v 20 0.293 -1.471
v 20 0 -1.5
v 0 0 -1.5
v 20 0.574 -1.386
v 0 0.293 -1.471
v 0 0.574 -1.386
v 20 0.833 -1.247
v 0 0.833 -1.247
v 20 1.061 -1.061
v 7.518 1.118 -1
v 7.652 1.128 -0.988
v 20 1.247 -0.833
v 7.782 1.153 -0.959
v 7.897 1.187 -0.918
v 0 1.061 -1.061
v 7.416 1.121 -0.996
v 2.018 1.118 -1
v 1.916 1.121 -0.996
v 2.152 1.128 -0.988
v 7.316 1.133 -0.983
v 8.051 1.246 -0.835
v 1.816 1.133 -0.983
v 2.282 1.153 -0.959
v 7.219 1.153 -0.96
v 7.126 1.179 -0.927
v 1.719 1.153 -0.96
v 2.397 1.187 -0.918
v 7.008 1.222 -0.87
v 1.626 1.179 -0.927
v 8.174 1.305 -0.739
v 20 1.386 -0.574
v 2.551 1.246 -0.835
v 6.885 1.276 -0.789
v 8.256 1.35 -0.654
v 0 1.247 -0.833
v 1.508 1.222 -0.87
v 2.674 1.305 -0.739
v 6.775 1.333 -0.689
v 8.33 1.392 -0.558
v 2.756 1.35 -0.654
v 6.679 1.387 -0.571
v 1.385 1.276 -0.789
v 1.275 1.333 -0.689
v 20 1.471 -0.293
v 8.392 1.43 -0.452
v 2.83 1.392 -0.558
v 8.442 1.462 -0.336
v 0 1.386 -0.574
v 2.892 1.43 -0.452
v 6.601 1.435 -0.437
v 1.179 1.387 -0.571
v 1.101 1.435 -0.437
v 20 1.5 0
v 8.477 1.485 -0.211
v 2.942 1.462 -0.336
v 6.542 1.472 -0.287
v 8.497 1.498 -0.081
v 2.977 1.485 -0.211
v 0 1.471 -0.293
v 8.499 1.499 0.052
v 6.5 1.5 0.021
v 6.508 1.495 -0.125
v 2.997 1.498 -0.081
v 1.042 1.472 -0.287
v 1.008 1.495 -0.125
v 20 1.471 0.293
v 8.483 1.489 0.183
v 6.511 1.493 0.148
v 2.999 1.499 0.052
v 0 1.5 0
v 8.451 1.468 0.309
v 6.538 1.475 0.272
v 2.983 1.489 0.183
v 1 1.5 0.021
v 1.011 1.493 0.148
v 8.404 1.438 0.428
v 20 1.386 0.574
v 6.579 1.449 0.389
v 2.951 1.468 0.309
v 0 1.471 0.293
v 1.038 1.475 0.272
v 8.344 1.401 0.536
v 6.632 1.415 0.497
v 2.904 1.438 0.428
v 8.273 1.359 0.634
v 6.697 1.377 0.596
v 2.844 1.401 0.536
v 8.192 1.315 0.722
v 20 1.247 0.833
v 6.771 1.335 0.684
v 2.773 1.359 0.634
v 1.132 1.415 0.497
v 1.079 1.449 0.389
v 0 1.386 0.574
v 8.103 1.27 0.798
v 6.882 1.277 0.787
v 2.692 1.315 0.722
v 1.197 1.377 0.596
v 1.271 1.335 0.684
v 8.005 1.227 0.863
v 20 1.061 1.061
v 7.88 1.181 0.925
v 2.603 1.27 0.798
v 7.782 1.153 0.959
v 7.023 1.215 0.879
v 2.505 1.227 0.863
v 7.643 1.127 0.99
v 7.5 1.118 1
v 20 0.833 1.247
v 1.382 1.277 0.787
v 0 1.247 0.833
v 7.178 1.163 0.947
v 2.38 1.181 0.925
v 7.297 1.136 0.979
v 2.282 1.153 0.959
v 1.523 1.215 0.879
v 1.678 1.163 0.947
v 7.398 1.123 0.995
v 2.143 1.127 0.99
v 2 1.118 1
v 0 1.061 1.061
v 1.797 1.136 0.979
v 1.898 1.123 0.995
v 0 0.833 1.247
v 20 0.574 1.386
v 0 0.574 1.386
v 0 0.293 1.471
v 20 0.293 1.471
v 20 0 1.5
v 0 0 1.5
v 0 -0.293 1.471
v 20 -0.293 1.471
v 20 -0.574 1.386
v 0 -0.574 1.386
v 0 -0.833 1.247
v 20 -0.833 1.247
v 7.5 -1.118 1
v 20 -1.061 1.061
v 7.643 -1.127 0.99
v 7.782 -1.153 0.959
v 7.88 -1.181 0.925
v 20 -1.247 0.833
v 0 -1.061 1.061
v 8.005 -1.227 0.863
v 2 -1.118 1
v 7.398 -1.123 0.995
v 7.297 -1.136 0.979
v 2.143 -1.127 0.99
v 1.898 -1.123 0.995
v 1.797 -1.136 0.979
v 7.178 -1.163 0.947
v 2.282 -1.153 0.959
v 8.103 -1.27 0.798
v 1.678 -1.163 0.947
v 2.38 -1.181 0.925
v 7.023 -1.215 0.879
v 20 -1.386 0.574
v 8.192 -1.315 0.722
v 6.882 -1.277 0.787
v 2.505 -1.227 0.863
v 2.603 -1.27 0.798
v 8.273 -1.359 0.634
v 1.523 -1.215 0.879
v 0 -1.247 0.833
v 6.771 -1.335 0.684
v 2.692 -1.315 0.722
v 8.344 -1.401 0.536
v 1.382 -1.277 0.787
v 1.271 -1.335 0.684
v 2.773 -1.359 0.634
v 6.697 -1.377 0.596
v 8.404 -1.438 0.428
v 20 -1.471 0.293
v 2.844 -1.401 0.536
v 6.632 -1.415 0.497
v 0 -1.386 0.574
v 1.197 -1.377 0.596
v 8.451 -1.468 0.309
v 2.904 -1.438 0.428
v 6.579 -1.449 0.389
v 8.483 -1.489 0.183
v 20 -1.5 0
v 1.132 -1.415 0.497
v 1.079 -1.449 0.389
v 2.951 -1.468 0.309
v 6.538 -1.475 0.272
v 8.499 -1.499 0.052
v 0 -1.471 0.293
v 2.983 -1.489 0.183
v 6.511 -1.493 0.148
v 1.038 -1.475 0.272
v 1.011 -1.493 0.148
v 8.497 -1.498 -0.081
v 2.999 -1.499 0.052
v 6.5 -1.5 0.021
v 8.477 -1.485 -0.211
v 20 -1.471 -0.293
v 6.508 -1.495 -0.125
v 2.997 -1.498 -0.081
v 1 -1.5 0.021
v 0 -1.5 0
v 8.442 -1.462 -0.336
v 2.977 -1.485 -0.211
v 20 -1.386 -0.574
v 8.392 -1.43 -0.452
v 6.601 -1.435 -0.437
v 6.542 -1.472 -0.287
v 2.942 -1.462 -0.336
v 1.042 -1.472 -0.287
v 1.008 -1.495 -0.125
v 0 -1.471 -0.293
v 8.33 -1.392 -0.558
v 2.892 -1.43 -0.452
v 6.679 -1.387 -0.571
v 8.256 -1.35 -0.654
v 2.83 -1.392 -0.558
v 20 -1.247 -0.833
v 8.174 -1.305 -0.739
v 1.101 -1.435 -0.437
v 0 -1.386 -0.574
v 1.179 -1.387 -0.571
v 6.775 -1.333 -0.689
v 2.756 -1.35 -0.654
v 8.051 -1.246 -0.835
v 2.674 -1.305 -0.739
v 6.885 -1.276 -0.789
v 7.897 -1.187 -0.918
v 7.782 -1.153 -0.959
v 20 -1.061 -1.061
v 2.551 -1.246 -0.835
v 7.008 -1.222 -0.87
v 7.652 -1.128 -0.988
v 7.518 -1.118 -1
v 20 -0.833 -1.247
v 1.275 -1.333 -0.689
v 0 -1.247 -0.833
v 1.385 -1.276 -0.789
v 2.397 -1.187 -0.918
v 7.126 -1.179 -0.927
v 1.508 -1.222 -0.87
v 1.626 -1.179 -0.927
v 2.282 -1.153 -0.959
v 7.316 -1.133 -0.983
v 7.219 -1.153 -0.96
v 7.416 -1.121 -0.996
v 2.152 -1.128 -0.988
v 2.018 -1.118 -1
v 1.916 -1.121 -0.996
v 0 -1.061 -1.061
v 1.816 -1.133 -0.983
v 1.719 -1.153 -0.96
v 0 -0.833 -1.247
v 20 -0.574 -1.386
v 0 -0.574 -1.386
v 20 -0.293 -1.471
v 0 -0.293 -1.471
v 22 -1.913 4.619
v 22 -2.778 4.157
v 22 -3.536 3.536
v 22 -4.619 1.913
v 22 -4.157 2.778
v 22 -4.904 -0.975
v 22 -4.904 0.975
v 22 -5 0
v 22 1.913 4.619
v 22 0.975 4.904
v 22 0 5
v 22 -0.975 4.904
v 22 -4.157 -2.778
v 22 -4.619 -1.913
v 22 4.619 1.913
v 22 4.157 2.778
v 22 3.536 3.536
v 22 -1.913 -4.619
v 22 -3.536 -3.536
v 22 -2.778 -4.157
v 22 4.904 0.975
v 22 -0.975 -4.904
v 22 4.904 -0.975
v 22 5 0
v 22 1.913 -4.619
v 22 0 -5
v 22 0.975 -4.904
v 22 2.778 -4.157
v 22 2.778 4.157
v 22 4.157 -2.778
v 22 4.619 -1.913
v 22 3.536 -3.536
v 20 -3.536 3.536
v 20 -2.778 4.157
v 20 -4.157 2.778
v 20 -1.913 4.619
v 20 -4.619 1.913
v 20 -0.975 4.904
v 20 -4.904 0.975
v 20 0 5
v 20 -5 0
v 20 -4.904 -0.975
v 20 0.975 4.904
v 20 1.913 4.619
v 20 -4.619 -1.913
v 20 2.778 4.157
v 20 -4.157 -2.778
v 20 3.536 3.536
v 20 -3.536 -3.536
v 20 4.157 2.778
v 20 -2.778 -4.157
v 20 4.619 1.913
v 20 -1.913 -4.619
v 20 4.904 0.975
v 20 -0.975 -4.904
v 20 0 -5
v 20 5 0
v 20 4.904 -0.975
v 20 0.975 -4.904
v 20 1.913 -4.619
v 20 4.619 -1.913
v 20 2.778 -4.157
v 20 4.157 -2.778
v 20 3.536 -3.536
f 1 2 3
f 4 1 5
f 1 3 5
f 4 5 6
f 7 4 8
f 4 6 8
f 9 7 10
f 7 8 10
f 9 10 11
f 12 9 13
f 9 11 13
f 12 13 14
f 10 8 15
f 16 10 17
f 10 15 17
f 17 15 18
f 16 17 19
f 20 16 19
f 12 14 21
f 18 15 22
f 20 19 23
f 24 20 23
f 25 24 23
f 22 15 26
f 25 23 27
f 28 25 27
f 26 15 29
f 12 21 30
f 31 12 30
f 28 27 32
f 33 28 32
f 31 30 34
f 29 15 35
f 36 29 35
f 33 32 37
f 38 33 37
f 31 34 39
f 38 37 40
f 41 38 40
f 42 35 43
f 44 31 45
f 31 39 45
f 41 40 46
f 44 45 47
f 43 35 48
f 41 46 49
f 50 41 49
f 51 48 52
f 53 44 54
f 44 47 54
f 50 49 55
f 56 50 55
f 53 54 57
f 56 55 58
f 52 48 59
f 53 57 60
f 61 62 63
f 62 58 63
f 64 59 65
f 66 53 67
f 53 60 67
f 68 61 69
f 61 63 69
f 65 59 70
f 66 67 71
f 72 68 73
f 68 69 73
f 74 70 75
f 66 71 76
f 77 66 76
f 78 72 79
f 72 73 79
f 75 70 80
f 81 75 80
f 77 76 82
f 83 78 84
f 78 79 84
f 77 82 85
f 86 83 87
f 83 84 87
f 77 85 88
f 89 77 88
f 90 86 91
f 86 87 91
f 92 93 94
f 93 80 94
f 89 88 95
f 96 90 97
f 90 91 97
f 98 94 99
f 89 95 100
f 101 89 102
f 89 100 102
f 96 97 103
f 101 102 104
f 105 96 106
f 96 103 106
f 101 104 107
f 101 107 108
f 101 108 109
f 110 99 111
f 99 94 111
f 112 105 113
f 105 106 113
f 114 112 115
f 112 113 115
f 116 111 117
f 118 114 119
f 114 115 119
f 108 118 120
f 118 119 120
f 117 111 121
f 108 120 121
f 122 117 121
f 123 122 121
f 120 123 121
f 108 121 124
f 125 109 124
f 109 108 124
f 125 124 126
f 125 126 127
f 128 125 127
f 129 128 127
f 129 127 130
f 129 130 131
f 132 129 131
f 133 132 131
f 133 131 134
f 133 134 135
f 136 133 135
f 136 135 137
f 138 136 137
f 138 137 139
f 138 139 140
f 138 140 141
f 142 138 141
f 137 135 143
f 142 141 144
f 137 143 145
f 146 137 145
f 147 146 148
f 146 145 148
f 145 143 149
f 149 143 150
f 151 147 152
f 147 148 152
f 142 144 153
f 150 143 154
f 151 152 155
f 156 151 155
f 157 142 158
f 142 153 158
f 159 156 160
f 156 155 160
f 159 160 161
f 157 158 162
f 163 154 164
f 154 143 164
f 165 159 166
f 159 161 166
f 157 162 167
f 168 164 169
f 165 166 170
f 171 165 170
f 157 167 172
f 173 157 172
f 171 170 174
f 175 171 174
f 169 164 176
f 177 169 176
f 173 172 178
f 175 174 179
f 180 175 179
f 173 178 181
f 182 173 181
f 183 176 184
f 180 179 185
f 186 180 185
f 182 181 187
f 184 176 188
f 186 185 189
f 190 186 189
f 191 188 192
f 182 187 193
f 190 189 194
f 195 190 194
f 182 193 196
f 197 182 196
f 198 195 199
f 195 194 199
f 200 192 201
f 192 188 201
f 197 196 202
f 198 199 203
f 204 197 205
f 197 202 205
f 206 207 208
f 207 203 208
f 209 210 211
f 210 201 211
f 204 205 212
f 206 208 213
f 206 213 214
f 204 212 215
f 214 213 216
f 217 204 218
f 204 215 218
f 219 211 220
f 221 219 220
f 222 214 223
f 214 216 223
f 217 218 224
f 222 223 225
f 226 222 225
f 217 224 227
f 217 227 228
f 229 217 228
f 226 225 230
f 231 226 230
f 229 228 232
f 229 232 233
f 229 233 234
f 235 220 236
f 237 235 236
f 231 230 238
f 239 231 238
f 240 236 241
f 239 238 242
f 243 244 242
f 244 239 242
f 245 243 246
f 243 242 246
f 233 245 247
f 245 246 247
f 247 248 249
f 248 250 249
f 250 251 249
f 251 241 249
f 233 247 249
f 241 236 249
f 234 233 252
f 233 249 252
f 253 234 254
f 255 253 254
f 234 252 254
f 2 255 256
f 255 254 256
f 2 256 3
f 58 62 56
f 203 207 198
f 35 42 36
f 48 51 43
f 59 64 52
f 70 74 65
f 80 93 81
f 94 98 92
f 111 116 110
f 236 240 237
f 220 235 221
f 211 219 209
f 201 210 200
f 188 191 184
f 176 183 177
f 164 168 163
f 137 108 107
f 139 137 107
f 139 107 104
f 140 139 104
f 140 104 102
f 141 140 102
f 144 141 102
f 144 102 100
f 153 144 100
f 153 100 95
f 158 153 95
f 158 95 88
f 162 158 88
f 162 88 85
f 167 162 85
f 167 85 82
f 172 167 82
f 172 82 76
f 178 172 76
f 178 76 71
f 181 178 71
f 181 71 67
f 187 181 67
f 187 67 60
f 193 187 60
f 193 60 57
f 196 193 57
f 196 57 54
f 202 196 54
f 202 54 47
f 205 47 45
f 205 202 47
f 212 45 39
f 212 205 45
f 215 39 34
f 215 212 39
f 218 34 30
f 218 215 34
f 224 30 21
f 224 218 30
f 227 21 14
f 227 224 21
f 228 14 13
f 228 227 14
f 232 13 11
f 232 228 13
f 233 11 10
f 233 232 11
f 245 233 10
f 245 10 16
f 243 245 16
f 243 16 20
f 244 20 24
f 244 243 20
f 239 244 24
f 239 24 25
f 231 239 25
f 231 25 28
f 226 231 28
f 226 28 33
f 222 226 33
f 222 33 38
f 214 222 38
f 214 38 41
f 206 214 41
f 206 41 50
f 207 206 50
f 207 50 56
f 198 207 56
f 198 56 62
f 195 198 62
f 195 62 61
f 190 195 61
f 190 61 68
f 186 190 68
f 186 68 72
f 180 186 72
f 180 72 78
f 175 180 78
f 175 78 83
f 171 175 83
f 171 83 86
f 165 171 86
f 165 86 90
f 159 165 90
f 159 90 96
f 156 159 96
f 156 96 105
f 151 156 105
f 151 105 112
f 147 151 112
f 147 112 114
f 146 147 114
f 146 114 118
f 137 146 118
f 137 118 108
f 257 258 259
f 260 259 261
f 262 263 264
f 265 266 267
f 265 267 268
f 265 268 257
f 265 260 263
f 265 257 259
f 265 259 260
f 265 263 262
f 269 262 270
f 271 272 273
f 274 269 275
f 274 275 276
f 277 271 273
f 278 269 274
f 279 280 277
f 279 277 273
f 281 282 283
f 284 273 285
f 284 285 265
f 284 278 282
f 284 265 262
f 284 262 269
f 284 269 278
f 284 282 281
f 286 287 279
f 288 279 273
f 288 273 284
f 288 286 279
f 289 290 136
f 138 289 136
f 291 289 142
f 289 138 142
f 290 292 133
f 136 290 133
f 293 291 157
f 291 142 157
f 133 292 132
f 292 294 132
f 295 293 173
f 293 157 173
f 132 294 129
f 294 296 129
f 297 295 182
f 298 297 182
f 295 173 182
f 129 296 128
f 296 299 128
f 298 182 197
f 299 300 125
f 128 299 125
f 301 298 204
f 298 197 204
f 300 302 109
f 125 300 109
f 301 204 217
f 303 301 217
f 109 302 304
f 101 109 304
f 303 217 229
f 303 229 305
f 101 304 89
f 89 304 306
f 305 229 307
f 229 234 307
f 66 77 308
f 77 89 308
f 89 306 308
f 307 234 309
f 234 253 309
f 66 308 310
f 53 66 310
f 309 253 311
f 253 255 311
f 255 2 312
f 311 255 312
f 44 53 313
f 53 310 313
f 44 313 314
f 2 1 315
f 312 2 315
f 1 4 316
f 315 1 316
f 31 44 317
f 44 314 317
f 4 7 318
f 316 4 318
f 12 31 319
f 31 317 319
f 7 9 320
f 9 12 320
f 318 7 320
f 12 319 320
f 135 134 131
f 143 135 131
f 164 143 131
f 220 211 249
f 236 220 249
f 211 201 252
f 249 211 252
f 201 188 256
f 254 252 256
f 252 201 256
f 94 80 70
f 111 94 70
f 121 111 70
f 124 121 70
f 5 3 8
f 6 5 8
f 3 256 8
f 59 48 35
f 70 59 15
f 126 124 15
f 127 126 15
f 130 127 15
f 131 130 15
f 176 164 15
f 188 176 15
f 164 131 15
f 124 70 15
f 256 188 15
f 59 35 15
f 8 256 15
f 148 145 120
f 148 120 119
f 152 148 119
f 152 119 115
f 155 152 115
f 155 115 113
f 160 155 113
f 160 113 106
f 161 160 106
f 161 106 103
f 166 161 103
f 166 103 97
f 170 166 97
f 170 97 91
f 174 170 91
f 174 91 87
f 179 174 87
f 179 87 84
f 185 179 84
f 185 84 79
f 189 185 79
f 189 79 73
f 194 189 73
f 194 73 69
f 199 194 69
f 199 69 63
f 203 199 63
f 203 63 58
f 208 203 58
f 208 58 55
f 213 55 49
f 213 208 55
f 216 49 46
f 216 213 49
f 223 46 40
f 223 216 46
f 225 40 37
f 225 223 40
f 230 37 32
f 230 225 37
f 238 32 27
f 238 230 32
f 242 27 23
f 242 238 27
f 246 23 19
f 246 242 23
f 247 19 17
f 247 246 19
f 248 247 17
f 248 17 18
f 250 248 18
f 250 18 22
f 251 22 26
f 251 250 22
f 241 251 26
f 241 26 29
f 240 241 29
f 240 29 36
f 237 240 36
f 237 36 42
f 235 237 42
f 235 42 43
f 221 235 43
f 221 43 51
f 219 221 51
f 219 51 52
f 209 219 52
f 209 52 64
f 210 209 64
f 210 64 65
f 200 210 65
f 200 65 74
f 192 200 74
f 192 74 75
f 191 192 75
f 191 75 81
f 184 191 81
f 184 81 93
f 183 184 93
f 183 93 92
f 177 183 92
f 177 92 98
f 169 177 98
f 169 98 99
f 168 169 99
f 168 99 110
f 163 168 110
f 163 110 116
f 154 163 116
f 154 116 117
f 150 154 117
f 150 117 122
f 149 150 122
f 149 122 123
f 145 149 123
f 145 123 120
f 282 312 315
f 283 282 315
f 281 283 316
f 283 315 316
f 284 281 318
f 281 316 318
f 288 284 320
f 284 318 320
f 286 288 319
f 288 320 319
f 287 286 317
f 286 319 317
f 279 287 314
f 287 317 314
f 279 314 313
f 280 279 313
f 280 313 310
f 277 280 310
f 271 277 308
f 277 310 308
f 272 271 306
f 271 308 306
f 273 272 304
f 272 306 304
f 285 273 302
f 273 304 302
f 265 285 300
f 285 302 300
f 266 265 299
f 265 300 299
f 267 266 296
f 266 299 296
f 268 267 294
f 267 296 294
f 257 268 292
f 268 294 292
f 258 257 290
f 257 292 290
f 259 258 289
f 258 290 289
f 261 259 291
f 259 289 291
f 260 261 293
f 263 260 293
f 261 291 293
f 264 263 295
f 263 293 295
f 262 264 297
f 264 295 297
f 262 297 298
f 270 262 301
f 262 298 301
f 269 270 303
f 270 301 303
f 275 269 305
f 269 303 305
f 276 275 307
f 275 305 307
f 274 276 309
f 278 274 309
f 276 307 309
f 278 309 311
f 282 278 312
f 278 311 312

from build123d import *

# Parameters (mm, degrees)
SKETCH1_R               = 1.5
BOSS_EXTRUDE4_DEPTH     = 20
SKETCH5_R               = 5
BOSS_EXTRUDE5_DEPTH     = 2
CUT_EXTRUDE1_DEPTH      = 24.108440017
CUT_EXTRUDE1_DEPTH_BACK = 24.108440017
SKETCH6_R               = 1


with BuildPart() as part:
    # Sketch1 → Boss-Extrude4 (new body)
    with BuildSketch(Plane(origin=(0, 0, 0), x_dir=(0, 0, -1), z_dir=(1, 0, 0))):
        Circle(SKETCH1_R)
    extrude(amount=BOSS_EXTRUDE4_DEPTH)

    # Sketch5 → Boss-Extrude5 (add)
    with BuildSketch(Plane(origin=(20, 0, 0), x_dir=(0, 0, -1), z_dir=(1, 0, 0))):
        Circle(SKETCH5_R)
    extrude(amount=BOSS_EXTRUDE5_DEPTH)

    # Sketch6 → Cut-Extrude1 (cut, two sides: drawn at the far end of the back side and taken through both)
    with BuildSketch(Plane(origin=(0, 0, 0), x_dir=(1, 0, 0), z_dir=(0, 1, 0)).offset(-CUT_EXTRUDE1_DEPTH_BACK)):
        with Locations(Location((2, 0, 0), (0, 0, 270))):
            Circle(SKETCH6_R)
        with Locations(Location((7.5, 0, 0), (0, 0, 270))):
            Circle(SKETCH6_R)
    extrude(amount=CUT_EXTRUDE1_DEPTH + CUT_EXTRUDE1_DEPTH_BACK, mode=Mode.SUBTRACT)


solid = part.part
